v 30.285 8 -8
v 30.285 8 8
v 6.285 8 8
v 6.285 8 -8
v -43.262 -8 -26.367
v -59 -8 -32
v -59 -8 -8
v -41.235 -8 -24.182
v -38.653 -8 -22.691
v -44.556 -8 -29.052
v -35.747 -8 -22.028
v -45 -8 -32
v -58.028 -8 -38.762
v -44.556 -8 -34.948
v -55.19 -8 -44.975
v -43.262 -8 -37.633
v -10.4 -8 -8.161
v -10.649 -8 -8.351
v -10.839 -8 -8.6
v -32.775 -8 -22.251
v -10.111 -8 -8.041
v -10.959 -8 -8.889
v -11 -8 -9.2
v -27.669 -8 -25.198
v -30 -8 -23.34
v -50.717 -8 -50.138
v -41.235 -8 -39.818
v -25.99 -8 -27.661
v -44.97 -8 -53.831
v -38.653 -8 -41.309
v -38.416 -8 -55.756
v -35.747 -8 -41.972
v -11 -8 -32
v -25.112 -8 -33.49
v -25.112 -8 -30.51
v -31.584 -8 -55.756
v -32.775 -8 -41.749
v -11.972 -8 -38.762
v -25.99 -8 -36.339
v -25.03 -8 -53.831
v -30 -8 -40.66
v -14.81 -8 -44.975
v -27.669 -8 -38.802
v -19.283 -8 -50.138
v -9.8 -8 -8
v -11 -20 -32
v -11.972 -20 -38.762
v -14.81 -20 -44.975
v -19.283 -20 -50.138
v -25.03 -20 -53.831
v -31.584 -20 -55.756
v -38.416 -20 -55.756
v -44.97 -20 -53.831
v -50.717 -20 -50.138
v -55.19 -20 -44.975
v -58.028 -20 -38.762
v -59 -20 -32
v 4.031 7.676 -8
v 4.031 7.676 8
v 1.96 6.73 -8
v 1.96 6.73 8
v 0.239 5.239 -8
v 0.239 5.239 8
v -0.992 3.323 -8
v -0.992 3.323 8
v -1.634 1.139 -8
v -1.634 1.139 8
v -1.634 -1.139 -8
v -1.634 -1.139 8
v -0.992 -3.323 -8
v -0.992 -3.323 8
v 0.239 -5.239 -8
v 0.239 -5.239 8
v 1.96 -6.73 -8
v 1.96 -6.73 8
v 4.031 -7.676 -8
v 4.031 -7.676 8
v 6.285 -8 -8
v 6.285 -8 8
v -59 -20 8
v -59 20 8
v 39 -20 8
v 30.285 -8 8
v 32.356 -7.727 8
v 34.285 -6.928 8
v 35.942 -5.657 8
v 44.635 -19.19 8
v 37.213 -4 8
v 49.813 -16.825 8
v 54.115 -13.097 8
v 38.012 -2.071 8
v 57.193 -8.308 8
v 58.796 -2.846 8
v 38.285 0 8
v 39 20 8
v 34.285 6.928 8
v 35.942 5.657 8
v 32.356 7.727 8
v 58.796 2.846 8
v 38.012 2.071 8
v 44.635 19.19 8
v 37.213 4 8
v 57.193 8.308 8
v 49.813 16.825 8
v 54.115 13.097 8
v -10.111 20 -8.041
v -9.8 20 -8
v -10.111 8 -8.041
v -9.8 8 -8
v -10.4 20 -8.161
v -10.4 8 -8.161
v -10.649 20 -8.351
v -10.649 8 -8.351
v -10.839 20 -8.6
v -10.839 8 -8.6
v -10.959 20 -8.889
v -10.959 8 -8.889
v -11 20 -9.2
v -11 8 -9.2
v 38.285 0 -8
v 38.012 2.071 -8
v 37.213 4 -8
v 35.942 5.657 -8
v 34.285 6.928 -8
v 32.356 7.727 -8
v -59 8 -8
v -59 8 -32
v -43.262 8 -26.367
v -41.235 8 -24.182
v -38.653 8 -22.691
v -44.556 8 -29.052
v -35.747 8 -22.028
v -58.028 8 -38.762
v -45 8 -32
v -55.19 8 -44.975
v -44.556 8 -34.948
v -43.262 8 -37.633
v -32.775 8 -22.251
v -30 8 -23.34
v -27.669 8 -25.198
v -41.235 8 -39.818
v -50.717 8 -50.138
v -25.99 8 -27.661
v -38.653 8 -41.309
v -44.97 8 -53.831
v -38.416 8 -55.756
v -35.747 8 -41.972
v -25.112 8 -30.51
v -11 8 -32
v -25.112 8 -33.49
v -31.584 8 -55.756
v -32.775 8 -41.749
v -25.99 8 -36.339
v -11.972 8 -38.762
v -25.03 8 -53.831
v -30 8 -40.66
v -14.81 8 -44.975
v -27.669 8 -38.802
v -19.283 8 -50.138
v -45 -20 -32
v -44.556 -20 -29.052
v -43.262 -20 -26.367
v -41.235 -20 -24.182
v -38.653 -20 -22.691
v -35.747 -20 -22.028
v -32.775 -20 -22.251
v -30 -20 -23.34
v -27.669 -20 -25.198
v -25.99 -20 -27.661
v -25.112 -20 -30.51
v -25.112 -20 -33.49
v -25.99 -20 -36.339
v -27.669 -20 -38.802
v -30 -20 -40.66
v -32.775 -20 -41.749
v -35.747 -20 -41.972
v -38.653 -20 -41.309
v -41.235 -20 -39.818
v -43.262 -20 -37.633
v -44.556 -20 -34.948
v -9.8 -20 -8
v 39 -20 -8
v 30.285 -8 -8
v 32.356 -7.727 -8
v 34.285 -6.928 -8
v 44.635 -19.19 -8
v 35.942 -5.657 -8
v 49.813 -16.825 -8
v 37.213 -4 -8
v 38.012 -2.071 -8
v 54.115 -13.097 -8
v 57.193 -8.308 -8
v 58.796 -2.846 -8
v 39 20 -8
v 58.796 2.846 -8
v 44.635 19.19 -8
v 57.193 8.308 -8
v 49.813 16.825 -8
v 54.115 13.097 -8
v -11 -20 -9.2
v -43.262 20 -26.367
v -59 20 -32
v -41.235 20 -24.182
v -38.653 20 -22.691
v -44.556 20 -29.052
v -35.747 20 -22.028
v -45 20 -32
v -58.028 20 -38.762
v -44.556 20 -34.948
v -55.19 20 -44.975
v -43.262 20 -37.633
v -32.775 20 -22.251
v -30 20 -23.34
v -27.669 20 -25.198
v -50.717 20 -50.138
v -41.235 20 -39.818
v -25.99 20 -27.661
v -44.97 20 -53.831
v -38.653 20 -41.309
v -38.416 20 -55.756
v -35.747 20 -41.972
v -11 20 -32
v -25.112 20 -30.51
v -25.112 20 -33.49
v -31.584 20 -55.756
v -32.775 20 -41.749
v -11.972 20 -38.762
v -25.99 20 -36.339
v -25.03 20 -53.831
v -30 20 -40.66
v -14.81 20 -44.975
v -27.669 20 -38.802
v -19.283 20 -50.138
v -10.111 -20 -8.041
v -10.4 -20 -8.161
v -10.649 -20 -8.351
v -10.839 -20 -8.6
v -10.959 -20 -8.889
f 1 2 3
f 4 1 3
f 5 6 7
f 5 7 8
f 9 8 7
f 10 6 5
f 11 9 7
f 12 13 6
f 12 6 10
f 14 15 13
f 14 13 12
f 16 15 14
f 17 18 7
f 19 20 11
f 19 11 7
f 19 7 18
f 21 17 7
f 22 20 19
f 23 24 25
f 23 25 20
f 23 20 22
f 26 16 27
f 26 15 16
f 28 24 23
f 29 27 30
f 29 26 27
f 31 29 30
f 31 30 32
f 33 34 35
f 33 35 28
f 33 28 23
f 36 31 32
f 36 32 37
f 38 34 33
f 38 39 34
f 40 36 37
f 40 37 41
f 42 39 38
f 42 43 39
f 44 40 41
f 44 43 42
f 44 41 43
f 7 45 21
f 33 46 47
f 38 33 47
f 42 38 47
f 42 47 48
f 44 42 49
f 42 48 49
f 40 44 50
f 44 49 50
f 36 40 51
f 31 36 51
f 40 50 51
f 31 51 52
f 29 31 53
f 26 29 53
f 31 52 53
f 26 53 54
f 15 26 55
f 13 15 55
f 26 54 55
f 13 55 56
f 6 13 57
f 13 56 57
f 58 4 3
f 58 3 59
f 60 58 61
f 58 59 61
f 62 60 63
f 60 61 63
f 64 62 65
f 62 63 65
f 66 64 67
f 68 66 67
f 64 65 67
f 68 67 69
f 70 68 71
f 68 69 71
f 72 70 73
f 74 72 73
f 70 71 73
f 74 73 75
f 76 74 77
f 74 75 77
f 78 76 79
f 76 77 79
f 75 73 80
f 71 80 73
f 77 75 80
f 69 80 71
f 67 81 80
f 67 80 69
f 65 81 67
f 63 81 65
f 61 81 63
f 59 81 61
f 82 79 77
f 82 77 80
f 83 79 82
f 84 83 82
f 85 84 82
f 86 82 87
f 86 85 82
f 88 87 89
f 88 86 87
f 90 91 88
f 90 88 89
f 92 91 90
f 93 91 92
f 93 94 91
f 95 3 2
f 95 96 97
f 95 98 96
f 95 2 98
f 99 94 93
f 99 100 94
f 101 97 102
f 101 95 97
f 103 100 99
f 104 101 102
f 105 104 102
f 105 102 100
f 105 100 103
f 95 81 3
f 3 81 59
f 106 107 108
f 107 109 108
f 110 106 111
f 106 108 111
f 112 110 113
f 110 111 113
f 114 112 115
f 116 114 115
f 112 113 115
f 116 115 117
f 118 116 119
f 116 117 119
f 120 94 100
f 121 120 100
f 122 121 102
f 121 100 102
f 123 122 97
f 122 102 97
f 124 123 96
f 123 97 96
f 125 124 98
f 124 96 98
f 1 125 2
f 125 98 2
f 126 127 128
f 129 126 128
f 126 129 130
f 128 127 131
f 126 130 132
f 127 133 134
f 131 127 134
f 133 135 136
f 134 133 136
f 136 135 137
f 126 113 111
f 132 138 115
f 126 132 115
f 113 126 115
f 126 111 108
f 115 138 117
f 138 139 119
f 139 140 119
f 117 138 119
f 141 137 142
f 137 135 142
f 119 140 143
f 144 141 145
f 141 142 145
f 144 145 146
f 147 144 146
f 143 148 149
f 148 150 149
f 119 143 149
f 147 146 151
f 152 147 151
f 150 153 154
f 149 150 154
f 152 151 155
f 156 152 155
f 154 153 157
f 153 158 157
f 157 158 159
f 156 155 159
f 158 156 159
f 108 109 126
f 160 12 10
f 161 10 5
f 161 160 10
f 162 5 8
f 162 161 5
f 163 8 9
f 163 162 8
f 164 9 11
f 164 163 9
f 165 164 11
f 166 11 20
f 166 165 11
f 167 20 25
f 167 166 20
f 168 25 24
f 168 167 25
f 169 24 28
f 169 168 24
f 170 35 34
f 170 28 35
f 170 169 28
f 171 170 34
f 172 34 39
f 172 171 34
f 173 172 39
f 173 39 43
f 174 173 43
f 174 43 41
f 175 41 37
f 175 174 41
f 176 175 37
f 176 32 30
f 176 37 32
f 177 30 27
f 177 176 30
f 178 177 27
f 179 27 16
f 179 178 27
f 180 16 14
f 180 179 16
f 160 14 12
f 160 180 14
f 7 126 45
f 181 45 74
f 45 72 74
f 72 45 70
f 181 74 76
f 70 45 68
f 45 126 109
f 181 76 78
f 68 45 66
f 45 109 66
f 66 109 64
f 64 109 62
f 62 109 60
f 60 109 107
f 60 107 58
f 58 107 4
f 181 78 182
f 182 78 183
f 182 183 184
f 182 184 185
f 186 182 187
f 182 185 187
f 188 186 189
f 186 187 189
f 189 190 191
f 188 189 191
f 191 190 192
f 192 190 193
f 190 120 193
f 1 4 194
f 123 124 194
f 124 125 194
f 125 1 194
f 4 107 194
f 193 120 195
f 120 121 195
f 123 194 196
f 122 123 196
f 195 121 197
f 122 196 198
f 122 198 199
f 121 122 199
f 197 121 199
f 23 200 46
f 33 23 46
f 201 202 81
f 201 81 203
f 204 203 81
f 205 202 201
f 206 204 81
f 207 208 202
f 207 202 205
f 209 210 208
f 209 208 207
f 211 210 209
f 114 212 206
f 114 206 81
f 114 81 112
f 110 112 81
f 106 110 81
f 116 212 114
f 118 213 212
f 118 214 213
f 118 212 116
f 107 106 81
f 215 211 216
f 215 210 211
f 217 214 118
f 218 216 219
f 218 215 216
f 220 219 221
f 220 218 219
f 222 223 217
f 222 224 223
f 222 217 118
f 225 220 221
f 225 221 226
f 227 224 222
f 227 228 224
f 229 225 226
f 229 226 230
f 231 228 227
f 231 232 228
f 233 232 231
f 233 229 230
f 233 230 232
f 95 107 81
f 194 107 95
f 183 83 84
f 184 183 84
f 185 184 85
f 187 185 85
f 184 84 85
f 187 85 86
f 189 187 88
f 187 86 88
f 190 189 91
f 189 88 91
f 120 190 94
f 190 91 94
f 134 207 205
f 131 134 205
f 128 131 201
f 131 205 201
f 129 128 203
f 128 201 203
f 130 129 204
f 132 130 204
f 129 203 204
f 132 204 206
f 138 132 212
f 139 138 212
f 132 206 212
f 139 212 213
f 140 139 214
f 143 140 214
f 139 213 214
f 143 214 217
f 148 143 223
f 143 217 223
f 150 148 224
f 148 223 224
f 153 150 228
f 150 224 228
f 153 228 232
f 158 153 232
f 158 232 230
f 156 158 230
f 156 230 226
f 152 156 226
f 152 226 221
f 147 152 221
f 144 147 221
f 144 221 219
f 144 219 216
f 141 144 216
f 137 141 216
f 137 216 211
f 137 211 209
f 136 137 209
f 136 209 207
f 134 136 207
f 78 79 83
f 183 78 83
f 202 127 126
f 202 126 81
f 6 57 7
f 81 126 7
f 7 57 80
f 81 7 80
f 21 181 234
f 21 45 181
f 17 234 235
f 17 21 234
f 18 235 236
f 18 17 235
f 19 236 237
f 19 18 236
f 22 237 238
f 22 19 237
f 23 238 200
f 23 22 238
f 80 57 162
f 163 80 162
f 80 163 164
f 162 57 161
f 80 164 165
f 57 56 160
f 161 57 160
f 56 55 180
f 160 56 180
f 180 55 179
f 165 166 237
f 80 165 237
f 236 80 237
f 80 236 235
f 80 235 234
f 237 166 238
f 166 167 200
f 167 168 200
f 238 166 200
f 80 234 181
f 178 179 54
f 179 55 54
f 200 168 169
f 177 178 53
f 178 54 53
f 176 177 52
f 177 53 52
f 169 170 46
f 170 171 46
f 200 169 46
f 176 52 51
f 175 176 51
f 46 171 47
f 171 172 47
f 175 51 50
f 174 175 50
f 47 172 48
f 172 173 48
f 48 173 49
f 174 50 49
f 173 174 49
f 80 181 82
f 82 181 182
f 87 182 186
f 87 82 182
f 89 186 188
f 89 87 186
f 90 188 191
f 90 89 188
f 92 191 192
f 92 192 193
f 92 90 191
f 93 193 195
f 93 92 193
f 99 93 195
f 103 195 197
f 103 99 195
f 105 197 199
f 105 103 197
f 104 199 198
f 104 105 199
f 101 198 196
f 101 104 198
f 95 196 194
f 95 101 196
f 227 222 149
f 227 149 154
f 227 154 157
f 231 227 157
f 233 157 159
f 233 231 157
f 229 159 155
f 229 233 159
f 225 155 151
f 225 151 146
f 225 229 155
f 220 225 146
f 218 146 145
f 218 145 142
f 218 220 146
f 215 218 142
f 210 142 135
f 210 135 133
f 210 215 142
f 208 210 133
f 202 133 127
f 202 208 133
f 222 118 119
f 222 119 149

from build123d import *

# Parameters (mm, degrees)
SKETCH2_R           = 20
BOSS_EXTRUDE1_DEPTH = 8
CUT_EXTRUDE2_DEPTH  = 65.319514924
BOSS_EXTRUDE2_DEPTH = 12
SKETCH6_R           = 10
CUT_EXTRUDE3_DEPTH  = 91.647669578
FILLET2_R           = 1.2
FILLET3_R           = 1.2


with BuildPart() as part:
    # Sketch2 → Boss-Extrude1 (new, symmetric)
    with BuildSketch(Plane.XY):
        with BuildLine():
            Line((39, 20), (-59, 20))
            Line((-59, 20), (-59, -20))
            Line((-59, -20), (39, -20))
            ThreePointArc((39, -20), (19, 0), (39, 20))
        make_face()
        with Locations((39, 0)):
            Circle(SKETCH2_R)
    extrude(amount=BOSS_EXTRUDE1_DEPTH, both=True)

    # Sketch3 → Cut-Extrude2 (cut, through all)
    with BuildSketch(Plane.XY.offset(8)):
        with BuildLine():
            ThreePointArc((14.284953176, 0), (11.941807426, 5.656854249), (6.284953176, 8))
            Line((6.284953176, 8), (6.284953176, -8))
            ThreePointArc((6.284953176, -8), (11.941807426, -5.656854249), (14.284953176, 0))
        make_face()
        with BuildLine():
            Line((6.284953176, -8), (6.284953176, 8))
            ThreePointArc((6.284953176, 8), (-1.715046824, 0), (6.284953176, -8))
        make_face()
        with BuildLine():
            Line((30.284953176, 8), (6.284953176, 8))
            ThreePointArc((6.284953176, 8), (11.941807426, 5.656854249), (14.284953176, 0))
            ThreePointArc((14.284953176, 0), (11.941807426, -5.656854249), (6.284953176, -8))
            Line((6.284953176, -8), (30.284953176, -8))
            ThreePointArc((30.284953176, -8), (22.284953176, 0), (30.284953176, 8))
        make_face()
        with BuildLine():
            ThreePointArc((38.284953176, 0), (35.941807426, 5.656854249), (30.284953176, 8))
            Line((30.284953176, 8), (30.284953176, -8))
            ThreePointArc((30.284953176, -8), (35.941807426, -5.656854249), (38.284953176, 0))
        make_face()
        with BuildLine():
            Line((30.284953176, -8), (30.284953176, 8))
            ThreePointArc((30.284953176, 8), (22.284953176, 0), (30.284953176, -8))
        make_face()
    extrude(amount=-CUT_EXTRUDE2_DEPTH, mode=Mode.SUBTRACT)

    # Sketch5 → Boss-Extrude2 (add)
    with BuildSketch(Plane(origin=(0, 20, 0), x_dir=(1, 0, 0), z_dir=(0, 1, 0))):
        with BuildLine():
            ThreePointArc((-59, 32), (-51.970562748, 15.029437252), (-35, 8))
            ThreePointArc((-35, 8), (-18.029437252, 15.029437252), (-11, 32))
            Line((-11, 32), (-59, 32))
        make_face()
        with BuildLine():
            ThreePointArc((-11, 32), (-35, 56), (-59, 32))
            Line((-59, 32), (-11, 32))
        make_face()
        with BuildLine():
            Line((-59, 32), (-59, 8))
            Line((-59, 8), (-35, 8))
            ThreePointArc((-35, 8), (-51.970562748, 15.029437252), (-59, 32))
        make_face()
        with BuildLine():
            ThreePointArc((-11, 32), (-18.029437252, 15.029437252), (-35, 8))
            Line((-35, 8), (-11, 8))
            Line((-11, 8), (-11, 32))
        make_face()
    boss_extrude2 = extrude(amount=-BOSS_EXTRUDE2_DEPTH)

    # Sketch6 → Cut-Extrude3 (cut, through all)
    with BuildSketch(Plane(origin=(0, 20, 0), x_dir=(1, 0, 0), z_dir=(0, 1, 0))):
        with Locations(Location((-35, 32, 0), (0, 0, 180))):
            Circle(SKETCH6_R)
    cut_extrude3 = extrude(amount=-CUT_EXTRUDE3_DEPTH, mode=Mode.SUBTRACT)

    # Mirror1: Boss-Extrude2, Cut-Extrude3 across plane
    add(boss_extrude2.mirror(Plane.ZX))
    add(cut_extrude3.mirror(Plane.ZX), mode=Mode.SUBTRACT)

    # Fillet2
    fillet2_edges = [part.edges().sort_by_distance(p)[0] for p in [
        (-11, 14, -8),
    ]]
    fillet(fillet2_edges, radius=FILLET2_R)

    # Fillet3
    fillet3_edges = [part.edges().sort_by_distance(p)[0] for p in [
        (-11, -14, -8),
    ]]
    fillet(fillet3_edges, radius=FILLET3_R)


solid = part.part
